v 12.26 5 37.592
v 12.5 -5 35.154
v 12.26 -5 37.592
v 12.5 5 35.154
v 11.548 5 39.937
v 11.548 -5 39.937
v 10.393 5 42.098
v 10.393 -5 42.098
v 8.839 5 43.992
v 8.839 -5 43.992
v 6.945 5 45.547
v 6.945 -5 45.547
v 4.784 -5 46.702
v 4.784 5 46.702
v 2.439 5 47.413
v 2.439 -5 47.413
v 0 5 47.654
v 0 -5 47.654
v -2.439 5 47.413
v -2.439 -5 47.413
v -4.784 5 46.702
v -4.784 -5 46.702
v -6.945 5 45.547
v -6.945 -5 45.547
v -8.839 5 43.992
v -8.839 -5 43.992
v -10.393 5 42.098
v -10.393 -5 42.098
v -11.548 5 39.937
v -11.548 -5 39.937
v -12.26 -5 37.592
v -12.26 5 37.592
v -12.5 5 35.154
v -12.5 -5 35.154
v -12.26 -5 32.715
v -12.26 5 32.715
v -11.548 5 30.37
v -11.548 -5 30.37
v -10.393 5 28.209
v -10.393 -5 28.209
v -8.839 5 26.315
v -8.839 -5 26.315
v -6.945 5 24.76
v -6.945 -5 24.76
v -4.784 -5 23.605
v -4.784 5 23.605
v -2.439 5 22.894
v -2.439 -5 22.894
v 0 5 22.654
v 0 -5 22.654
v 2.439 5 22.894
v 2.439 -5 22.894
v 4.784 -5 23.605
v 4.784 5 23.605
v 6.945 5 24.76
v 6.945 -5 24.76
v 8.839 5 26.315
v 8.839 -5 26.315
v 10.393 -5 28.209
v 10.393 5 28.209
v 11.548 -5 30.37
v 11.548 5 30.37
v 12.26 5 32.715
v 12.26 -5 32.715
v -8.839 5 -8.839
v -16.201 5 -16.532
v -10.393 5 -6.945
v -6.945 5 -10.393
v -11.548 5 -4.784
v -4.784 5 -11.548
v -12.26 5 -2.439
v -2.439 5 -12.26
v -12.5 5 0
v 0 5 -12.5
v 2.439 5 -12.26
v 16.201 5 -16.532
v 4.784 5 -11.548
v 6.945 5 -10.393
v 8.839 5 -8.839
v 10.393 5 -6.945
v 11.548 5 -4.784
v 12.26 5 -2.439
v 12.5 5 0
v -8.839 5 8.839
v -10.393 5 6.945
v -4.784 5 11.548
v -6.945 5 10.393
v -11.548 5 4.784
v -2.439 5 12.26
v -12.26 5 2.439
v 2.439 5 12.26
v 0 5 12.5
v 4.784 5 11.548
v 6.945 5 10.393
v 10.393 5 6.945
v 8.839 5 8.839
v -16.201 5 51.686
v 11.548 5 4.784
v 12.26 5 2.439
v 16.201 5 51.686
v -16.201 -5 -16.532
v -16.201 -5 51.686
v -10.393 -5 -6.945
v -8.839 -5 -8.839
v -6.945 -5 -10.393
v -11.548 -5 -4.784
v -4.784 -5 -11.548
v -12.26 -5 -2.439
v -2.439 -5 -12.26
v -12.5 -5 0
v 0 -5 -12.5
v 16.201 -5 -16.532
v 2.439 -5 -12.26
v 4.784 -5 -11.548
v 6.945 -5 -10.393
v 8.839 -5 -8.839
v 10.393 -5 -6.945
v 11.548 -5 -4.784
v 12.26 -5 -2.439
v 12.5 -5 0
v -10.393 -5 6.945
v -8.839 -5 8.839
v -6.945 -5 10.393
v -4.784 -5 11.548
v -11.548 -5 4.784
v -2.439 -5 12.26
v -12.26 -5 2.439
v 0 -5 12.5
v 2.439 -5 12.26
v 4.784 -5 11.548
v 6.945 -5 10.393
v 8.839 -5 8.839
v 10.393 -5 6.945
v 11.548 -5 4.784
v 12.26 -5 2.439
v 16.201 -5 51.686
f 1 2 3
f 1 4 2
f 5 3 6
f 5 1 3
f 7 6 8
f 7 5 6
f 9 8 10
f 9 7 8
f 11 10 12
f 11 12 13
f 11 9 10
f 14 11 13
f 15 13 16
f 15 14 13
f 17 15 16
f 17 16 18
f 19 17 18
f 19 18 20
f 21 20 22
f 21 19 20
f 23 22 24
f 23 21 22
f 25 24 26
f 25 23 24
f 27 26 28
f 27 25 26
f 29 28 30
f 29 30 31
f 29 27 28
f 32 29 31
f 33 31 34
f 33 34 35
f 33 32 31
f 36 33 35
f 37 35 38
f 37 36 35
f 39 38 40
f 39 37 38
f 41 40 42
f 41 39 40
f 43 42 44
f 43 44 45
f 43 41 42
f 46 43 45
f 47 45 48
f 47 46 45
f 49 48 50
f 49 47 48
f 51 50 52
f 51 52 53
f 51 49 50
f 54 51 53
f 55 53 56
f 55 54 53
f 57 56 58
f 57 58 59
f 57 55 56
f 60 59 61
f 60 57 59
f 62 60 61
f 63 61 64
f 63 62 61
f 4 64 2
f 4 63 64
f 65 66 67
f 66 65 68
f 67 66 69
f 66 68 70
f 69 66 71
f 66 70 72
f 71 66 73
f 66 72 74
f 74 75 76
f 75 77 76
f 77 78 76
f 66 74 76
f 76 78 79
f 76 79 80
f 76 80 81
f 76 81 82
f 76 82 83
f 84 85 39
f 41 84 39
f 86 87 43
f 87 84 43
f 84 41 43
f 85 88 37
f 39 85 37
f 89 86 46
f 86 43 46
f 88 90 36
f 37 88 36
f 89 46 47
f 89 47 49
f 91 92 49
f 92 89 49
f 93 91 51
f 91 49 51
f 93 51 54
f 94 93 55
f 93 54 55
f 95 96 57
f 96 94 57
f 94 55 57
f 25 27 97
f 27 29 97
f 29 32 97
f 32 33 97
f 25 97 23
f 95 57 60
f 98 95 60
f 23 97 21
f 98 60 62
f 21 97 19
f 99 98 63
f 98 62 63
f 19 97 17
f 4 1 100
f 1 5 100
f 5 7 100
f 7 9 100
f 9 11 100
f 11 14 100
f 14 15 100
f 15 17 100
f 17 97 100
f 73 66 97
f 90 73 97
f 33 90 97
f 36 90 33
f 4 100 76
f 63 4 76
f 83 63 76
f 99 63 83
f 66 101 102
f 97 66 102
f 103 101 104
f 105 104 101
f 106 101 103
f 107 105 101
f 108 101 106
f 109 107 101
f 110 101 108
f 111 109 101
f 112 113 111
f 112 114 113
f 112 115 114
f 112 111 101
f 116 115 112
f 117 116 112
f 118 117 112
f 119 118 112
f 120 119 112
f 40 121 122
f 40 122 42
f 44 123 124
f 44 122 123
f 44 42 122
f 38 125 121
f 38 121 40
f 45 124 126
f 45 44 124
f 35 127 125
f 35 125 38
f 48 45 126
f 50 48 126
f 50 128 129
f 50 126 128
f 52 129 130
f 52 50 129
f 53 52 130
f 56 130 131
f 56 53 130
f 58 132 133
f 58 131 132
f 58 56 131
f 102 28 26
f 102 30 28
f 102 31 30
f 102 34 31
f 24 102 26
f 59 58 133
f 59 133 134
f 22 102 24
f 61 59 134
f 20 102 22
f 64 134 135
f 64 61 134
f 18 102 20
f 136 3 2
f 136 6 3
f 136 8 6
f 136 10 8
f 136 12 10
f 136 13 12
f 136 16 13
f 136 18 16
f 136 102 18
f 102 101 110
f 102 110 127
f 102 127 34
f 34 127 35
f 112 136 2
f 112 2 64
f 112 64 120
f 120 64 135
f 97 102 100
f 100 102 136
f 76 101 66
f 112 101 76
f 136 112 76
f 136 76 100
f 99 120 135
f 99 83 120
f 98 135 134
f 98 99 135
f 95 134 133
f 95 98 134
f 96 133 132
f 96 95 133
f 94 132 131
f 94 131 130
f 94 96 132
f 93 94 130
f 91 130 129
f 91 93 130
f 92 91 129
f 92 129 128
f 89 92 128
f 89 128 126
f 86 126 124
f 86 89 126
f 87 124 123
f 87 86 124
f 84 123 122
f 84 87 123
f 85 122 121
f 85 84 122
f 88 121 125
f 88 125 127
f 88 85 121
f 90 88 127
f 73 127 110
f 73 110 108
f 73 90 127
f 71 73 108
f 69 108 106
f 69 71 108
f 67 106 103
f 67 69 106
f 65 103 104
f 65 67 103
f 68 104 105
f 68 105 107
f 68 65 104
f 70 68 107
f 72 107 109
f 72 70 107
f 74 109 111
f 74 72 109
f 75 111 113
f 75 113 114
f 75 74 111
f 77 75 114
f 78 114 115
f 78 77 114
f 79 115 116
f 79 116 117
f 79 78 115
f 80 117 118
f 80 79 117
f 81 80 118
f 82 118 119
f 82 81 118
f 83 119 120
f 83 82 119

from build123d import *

# Parameters (mm, degrees)
F0_W     = 32.402042
F0_H     = 68.217468
F0_R     = 12.5
F1_DEPTH = 5


with BuildPart() as f1:
    # F0 (on Front) → F1 (new body, symmetric)
    with BuildSketch(Plane.XZ):
        with Locations((0, 17.5768)):
            Rectangle(F0_W, F0_H)
        Circle(F0_R, mode=Mode.SUBTRACT)
        with Locations((0, 35.1536)):
            Circle(F0_R, mode=Mode.SUBTRACT)
    extrude(amount=F1_DEPTH, both=True)


solid = f1.part
